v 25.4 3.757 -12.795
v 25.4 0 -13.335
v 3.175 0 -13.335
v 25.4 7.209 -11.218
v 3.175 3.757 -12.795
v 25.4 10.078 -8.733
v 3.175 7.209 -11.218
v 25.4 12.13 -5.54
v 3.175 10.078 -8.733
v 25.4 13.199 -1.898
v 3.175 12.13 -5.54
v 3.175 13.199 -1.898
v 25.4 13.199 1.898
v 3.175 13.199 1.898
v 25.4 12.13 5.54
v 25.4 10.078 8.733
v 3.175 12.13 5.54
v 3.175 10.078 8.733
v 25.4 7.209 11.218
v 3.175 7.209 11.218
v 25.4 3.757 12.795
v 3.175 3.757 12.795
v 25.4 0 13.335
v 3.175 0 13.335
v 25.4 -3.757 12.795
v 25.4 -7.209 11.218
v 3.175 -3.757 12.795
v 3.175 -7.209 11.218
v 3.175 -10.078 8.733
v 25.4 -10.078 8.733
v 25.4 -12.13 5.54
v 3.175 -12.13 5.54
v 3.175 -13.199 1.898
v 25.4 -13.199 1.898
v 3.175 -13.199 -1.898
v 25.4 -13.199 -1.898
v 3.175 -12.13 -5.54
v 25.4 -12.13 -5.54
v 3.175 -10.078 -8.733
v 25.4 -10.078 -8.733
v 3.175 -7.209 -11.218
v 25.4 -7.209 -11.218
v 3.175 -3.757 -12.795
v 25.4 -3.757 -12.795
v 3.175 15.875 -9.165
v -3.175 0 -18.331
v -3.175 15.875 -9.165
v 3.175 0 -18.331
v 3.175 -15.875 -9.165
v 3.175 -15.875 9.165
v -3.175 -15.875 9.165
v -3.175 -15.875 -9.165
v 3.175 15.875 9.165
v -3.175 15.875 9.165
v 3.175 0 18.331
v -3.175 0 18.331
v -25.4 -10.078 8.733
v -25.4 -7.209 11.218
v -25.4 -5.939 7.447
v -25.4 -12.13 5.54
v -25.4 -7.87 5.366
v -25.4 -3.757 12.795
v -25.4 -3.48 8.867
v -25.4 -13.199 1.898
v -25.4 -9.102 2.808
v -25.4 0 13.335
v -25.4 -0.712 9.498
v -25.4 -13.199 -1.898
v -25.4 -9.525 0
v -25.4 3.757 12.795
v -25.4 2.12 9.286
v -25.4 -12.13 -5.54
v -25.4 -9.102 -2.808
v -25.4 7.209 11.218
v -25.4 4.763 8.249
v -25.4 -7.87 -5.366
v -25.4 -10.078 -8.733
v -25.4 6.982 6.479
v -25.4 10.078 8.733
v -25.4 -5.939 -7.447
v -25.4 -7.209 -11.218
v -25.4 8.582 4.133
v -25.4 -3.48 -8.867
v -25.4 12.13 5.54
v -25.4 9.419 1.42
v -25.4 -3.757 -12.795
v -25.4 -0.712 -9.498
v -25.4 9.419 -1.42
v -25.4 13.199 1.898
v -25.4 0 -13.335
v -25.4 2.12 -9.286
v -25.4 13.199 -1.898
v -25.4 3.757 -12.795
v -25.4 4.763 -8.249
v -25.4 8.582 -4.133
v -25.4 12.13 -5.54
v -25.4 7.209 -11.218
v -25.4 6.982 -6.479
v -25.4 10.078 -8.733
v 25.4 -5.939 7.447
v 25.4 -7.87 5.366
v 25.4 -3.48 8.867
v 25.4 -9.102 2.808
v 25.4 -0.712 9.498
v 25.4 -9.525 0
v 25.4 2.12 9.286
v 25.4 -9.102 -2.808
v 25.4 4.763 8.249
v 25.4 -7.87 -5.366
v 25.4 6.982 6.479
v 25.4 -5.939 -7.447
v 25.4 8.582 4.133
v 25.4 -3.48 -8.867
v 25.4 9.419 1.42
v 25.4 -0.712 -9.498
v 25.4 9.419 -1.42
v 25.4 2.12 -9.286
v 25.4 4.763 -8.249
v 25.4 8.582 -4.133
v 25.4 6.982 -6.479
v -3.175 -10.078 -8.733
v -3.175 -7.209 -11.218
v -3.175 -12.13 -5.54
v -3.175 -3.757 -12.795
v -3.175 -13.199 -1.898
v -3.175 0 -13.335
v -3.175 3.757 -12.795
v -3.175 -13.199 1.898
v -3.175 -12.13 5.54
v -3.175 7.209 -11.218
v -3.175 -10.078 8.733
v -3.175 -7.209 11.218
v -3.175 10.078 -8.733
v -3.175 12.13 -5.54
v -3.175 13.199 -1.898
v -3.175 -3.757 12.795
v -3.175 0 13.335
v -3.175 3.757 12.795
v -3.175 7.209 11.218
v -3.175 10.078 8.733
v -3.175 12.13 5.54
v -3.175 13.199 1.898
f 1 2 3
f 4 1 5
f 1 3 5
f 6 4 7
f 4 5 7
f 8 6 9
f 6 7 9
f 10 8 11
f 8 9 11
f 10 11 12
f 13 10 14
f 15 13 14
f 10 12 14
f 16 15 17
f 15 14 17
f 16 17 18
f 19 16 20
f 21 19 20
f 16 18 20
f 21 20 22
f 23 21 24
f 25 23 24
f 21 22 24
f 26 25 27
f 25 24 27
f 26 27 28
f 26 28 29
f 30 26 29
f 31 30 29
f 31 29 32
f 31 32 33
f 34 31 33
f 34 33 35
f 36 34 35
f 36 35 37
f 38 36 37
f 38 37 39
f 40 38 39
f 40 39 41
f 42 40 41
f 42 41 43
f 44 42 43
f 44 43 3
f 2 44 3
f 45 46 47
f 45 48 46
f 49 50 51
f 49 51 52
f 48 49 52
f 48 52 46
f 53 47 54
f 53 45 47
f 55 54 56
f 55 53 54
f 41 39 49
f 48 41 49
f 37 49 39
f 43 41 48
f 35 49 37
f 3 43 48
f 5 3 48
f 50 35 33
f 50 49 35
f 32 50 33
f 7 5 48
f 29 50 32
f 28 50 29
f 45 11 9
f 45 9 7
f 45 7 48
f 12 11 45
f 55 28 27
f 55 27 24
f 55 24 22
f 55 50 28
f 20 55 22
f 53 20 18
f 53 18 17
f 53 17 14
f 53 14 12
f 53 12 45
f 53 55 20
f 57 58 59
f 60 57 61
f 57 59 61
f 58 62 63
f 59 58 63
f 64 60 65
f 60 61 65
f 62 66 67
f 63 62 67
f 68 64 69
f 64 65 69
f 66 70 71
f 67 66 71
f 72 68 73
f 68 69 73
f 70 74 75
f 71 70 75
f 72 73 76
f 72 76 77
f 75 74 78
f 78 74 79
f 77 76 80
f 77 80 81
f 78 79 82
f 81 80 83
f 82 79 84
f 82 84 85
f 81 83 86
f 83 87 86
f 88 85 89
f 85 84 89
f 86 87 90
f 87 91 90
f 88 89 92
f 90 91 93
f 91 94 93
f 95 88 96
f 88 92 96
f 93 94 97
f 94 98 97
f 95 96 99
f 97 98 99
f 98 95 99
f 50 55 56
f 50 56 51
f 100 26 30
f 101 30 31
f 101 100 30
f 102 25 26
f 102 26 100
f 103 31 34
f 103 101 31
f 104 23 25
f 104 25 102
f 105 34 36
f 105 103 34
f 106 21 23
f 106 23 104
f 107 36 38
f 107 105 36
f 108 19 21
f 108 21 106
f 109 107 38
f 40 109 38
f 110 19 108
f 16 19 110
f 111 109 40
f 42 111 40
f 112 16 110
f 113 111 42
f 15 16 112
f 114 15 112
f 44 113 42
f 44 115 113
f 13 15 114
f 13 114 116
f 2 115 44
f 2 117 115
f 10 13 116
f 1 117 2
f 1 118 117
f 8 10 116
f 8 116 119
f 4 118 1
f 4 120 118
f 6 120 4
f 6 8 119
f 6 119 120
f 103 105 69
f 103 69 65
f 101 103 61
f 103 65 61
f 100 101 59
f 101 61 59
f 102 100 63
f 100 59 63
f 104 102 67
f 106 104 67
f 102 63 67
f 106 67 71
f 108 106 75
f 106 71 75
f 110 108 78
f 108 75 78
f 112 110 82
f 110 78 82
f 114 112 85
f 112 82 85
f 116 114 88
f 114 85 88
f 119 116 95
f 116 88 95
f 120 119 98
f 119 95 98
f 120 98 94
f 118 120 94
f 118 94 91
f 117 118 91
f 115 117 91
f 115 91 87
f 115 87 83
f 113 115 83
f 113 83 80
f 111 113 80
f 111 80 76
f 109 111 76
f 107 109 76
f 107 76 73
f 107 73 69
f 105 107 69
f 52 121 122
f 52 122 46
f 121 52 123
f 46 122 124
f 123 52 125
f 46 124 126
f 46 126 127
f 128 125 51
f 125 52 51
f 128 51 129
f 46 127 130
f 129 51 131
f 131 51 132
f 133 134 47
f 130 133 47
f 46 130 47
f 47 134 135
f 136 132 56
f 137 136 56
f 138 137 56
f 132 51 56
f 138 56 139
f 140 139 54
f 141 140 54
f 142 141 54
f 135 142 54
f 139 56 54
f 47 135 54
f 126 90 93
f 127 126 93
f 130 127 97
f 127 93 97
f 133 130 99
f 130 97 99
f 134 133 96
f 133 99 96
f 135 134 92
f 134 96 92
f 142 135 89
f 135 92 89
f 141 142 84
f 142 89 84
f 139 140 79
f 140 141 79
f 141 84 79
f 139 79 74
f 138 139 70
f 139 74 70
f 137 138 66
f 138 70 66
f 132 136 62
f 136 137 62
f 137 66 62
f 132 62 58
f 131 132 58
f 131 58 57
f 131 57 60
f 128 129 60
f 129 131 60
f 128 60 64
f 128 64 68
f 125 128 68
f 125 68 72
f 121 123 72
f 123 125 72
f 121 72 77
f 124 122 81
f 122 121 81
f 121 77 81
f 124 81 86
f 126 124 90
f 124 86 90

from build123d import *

# Parameters (mm, degrees)
PAD_DEPTH            = 3.175
CYLINDER_R           = 13.335
CYLINDER_DEPTH       = 50.8
CYLINDER_PITCH_ANGLE = 90
SKETCH002_R          = 9.525
POCKET_DEPTH         = 50.801


with BuildPart() as pad:
    # Sketch001 → Pad (new body, symmetric)
    with BuildSketch(Plane.YZ):
        Polygon((15.875, 9.165436), (0, 18.330871), (-15.875, 9.165436), (-15.875, -9.165436), (0, -18.330871), (15.875, -9.165436), align=None)
    extrude(amount=PAD_DEPTH, both=True)


with BuildPart() as pocket:
    # Cylinder → Cylinder (new body)
    with BuildSketch(Plane.XY):
        Circle(CYLINDER_R)
    extrude(amount=CYLINDER_DEPTH)


with BuildPart() as pocket_1:
    # Cylinder pitch: moved
    add(pocket.part.rotate(Axis((0, 0, 0), (0, 1, 0)), CYLINDER_PITCH_ANGLE))


with BuildPart() as pocket_2:
    # Cylinder placement: moved
    add(pocket_1.part.moved(Location((-25.4, 0, 0))))

    # Fusion: union Pad
    add(pad.part)

    # Sketch002 → Pocket (cut, through all)
    with BuildSketch(Plane(origin=(-25.4, 0, 0), x_dir=(0, -1, 0), z_dir=(-1, 0, 0))):
        Circle(SKETCH002_R)
    extrude(amount=-POCKET_DEPTH, mode=Mode.SUBTRACT)


solid = pocket_2.part
